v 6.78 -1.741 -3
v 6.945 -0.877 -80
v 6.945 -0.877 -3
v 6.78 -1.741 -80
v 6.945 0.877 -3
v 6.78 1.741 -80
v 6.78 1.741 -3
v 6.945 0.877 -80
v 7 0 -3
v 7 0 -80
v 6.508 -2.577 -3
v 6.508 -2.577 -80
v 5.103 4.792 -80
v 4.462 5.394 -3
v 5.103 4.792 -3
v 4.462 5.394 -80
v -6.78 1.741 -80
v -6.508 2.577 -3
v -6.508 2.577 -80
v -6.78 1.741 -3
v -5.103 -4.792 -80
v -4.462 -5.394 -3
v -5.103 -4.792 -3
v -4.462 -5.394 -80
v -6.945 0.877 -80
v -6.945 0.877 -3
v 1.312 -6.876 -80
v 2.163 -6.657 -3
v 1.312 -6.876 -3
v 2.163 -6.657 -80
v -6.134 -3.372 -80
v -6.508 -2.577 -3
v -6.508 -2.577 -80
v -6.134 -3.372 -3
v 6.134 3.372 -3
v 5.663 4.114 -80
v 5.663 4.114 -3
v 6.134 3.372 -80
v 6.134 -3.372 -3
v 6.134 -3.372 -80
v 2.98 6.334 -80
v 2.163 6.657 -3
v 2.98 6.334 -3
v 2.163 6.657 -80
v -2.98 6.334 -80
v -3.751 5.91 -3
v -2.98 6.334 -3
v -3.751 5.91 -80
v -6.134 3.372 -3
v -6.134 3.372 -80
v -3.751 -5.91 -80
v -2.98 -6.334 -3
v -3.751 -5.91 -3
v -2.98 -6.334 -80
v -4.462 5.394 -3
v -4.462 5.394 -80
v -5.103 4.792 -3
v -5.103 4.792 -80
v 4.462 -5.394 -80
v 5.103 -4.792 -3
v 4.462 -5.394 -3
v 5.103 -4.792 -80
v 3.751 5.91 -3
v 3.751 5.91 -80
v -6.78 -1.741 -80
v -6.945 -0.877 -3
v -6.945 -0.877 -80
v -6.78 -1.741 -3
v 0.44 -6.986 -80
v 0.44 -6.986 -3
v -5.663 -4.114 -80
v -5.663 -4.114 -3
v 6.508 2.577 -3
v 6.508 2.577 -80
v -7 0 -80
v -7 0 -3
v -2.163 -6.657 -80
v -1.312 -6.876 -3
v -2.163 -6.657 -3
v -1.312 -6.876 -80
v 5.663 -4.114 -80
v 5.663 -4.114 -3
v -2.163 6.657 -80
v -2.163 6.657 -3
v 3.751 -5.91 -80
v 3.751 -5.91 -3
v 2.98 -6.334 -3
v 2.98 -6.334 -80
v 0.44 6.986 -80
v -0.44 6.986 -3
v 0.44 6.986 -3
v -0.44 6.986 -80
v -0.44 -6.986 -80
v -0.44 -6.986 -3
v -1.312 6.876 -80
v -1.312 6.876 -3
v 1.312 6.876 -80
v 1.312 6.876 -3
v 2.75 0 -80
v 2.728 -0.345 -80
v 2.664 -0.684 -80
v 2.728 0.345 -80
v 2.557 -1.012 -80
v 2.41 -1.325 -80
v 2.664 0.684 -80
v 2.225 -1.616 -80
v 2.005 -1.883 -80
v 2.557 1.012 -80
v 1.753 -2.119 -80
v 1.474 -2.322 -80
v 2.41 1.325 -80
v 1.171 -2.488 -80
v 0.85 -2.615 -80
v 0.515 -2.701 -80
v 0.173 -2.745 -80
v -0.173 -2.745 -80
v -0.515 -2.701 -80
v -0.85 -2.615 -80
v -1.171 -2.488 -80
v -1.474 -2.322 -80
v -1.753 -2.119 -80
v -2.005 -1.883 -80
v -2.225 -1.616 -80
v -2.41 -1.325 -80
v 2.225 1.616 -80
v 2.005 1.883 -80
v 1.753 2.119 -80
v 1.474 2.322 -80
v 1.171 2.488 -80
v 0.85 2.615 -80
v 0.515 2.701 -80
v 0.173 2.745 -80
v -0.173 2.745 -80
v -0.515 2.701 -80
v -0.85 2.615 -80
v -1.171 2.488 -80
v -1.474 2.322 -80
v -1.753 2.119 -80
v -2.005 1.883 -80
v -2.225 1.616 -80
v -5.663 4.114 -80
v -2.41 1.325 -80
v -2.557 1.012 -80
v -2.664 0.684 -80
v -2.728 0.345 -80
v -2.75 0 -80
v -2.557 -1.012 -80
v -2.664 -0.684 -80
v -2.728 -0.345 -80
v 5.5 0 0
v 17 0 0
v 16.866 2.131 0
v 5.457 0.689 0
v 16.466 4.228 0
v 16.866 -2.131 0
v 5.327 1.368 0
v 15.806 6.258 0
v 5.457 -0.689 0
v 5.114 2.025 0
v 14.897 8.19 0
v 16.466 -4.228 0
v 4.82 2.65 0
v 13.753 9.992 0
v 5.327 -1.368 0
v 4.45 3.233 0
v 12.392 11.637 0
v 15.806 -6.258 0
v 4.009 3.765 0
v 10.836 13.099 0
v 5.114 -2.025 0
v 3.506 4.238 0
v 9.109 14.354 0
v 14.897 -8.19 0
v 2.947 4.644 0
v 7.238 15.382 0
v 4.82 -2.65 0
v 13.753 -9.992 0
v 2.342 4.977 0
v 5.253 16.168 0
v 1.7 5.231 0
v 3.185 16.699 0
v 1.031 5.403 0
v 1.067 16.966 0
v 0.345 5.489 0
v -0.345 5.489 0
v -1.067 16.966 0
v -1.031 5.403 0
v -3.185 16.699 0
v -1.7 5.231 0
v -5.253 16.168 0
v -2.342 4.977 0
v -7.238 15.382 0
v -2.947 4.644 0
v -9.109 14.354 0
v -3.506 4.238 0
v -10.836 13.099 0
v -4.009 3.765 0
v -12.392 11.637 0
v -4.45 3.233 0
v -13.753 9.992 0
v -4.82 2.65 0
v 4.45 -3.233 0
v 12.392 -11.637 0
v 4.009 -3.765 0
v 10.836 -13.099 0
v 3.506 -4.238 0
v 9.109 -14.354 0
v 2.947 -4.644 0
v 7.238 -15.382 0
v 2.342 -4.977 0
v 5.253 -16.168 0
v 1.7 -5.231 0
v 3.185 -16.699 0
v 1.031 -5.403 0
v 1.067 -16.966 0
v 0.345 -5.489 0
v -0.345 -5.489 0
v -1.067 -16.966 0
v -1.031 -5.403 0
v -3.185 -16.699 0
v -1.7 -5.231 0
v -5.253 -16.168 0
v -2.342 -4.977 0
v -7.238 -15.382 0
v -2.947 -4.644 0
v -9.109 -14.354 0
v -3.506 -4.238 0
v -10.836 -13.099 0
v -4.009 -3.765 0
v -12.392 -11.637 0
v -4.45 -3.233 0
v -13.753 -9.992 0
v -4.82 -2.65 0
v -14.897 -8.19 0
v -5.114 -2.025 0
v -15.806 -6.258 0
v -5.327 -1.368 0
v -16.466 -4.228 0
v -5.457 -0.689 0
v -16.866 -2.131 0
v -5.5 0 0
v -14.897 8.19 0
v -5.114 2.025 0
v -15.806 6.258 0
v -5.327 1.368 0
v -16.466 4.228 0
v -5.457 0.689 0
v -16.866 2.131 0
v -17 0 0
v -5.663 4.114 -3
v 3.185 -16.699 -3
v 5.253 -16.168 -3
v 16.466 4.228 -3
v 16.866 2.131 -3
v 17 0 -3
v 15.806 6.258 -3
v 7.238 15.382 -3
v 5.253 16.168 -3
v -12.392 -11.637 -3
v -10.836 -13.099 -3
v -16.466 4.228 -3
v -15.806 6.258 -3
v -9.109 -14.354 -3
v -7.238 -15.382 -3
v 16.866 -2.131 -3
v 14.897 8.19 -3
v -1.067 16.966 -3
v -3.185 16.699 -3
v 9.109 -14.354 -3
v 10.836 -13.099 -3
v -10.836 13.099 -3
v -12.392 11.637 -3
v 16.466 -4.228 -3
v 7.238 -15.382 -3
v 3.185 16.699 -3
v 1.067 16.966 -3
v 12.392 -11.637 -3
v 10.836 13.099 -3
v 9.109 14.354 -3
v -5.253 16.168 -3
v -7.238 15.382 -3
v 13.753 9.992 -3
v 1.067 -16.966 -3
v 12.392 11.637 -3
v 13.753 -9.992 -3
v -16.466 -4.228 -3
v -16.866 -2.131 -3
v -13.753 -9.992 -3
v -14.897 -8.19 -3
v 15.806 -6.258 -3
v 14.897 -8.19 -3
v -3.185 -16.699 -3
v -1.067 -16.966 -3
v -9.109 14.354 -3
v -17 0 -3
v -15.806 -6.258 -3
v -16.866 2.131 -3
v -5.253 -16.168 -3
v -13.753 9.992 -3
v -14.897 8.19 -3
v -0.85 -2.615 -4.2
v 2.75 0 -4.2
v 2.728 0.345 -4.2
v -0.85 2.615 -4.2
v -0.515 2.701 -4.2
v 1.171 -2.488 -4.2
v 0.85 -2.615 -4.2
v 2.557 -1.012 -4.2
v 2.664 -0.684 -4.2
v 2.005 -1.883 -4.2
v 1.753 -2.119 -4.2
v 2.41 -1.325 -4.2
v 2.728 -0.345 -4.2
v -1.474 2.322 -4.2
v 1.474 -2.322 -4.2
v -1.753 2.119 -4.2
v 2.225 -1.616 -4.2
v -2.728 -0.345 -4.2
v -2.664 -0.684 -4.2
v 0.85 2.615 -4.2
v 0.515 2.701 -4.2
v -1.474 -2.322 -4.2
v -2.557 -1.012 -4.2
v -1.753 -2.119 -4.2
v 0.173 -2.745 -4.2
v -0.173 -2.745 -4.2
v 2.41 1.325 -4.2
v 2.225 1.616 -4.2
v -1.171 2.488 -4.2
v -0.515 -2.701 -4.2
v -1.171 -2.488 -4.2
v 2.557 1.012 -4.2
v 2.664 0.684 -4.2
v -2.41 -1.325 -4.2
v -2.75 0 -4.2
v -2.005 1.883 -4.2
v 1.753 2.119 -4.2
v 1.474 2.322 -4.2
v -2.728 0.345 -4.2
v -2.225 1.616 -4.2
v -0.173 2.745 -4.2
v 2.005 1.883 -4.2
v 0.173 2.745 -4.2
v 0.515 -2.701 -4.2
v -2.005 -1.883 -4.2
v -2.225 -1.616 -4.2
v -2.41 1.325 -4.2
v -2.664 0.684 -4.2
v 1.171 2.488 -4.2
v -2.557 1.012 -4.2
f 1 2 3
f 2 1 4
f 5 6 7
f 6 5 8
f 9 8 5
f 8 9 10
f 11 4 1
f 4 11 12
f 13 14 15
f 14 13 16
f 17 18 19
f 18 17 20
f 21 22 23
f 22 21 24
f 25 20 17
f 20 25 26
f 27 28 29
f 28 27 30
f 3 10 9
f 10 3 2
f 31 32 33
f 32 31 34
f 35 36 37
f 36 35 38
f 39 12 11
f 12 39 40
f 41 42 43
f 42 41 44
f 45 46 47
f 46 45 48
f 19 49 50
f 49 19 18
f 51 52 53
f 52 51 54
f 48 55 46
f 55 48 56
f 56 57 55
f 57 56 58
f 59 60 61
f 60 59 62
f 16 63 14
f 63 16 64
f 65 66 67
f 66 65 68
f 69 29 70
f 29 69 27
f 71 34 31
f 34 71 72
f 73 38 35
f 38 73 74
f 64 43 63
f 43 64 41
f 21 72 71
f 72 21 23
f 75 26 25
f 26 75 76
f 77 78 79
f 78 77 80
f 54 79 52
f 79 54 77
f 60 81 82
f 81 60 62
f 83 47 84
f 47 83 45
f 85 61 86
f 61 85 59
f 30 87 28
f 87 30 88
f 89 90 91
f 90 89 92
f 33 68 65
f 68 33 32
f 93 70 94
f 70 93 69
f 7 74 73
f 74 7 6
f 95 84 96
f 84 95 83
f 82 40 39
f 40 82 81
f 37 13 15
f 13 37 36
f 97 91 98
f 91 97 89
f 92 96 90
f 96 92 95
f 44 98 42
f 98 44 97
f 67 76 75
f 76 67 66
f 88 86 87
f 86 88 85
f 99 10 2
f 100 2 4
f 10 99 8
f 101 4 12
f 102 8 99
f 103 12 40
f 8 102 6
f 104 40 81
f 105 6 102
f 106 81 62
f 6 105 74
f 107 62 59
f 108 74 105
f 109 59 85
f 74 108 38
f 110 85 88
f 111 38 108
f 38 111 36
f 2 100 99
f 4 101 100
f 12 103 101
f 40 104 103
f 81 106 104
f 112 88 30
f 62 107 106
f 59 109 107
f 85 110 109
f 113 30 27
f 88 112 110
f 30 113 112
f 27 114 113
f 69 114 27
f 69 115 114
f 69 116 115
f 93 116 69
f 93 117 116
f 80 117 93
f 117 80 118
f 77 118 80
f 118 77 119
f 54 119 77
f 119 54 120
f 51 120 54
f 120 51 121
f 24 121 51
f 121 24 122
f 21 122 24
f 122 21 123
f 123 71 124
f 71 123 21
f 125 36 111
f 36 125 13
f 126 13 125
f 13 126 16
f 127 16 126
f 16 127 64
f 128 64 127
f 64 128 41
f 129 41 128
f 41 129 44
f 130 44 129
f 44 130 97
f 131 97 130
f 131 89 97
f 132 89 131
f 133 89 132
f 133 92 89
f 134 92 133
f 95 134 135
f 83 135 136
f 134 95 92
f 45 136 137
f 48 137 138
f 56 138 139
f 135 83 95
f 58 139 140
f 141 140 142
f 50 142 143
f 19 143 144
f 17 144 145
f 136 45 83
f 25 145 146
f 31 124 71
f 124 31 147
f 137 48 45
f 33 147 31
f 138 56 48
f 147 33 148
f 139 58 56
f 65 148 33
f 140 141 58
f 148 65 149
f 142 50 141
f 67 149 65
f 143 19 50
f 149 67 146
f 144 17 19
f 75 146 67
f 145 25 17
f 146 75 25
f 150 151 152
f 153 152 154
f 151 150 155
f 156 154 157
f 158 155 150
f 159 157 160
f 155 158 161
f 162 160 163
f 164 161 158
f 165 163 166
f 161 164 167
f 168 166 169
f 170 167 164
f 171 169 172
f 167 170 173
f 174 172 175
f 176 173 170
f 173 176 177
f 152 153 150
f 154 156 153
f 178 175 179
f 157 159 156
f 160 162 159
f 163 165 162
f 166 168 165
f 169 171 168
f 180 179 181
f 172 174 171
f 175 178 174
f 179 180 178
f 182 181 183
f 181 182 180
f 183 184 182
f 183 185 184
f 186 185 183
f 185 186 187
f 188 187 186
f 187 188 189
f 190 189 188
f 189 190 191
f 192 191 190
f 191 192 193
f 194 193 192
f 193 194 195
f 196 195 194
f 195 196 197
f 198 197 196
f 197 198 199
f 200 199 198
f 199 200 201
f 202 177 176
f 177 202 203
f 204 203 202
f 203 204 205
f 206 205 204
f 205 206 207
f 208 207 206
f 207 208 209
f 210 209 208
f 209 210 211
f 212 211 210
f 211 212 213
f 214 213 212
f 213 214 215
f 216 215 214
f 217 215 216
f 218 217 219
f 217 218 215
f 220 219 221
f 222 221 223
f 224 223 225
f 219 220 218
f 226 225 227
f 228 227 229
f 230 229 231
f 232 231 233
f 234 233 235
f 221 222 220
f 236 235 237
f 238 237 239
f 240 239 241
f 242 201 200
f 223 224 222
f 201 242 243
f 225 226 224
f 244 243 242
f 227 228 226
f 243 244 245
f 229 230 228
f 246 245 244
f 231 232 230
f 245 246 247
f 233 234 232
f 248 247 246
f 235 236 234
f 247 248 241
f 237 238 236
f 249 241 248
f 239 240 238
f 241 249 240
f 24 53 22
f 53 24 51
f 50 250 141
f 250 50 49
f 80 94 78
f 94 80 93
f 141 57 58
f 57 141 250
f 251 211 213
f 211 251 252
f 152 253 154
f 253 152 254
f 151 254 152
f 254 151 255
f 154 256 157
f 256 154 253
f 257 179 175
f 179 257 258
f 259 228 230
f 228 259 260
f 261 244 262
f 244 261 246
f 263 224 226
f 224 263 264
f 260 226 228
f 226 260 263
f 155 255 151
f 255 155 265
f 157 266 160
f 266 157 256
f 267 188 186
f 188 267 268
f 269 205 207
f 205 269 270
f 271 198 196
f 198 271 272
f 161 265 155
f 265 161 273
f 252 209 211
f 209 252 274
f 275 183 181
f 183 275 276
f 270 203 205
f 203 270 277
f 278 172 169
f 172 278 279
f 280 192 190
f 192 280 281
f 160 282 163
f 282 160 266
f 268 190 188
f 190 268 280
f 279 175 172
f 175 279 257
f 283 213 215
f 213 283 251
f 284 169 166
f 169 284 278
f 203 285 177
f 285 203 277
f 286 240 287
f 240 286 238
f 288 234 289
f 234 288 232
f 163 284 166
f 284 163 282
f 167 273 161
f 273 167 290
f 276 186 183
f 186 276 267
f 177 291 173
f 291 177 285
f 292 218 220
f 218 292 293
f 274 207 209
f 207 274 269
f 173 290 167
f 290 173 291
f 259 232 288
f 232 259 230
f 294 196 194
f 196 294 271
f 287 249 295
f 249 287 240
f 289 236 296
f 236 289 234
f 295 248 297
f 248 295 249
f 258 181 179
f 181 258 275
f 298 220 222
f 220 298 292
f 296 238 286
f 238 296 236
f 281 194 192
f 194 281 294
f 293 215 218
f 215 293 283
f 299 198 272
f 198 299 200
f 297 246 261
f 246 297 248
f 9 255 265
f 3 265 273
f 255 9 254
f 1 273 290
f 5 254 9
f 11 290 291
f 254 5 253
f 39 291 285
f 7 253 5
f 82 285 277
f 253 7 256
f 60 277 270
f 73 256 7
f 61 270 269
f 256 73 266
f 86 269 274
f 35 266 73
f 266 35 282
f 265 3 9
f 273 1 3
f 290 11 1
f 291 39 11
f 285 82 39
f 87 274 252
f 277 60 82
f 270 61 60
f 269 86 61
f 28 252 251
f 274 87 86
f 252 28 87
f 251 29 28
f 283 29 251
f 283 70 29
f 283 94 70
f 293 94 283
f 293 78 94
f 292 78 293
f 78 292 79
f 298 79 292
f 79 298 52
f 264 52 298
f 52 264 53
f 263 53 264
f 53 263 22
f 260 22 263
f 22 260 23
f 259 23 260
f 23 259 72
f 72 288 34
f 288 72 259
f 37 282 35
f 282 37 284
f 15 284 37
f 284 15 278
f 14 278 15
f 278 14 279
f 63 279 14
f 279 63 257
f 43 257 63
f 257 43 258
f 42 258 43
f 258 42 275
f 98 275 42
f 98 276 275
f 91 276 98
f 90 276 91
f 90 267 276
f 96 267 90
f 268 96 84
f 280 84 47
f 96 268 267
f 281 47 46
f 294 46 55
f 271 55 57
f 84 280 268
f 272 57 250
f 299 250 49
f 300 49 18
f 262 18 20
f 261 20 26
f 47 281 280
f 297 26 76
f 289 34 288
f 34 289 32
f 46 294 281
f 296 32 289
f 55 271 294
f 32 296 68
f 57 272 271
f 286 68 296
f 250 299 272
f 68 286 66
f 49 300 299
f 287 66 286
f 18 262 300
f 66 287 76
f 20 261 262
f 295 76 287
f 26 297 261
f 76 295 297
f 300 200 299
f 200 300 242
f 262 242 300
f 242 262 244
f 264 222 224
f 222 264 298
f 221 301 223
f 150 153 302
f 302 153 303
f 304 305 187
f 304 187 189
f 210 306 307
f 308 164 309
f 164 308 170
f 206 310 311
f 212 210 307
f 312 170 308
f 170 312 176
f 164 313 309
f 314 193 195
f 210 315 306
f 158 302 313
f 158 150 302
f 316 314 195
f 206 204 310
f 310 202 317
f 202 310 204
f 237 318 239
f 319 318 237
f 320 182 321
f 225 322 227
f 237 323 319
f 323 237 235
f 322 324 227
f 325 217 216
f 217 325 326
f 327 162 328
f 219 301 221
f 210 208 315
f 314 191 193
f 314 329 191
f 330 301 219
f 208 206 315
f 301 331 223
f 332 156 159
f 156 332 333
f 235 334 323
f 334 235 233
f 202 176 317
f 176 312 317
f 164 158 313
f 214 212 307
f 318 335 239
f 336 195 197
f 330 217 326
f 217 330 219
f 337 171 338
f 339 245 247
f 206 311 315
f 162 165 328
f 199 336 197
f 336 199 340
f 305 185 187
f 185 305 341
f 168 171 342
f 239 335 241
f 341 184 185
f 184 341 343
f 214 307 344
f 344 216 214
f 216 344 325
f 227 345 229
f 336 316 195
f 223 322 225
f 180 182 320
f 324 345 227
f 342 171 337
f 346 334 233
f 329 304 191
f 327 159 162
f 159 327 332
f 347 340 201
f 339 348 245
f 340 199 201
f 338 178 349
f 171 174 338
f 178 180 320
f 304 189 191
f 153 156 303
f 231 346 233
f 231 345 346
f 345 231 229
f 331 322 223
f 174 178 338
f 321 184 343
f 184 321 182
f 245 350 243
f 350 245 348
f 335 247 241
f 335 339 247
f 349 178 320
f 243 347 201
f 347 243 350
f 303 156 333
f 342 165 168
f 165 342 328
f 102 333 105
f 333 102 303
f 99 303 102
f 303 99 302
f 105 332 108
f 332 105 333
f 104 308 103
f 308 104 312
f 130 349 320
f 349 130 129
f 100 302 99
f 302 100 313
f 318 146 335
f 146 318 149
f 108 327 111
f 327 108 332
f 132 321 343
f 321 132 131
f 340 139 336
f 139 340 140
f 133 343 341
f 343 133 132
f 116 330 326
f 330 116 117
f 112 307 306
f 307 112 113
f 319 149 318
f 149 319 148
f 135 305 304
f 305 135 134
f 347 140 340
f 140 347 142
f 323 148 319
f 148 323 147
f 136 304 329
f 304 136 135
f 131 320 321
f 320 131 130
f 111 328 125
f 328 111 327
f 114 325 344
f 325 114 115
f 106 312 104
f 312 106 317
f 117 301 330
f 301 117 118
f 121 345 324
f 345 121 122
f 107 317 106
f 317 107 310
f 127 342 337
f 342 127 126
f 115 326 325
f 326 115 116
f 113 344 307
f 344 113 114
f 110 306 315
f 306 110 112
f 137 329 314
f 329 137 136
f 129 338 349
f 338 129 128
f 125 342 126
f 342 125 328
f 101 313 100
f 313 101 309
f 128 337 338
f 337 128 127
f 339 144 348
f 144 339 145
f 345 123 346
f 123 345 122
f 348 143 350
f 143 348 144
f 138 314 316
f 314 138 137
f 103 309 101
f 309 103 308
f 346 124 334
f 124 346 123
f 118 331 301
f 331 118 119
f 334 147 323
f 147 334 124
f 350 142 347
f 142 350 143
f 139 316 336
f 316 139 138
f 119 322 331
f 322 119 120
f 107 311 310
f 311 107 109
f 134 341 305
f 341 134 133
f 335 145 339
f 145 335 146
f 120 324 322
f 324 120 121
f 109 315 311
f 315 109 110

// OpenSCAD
$fn = 50;


difference() {
	union() {
		translate(v = [0, 0, -80.0000000000]) {
			cylinder(h = 80, r = 7.0000000000);
		}
		translate(v = [0, 0, -3.0000000000]) {
			cylinder(h = 3, r = 17.0000000000);
		}
	}
	union() {
		translate(v = [0, 0, 0]) {
			rotate(a = [0, 0, 0]) {
				difference() {
					union() {
						#translate(v = [0, 0, -80.0000000000]) {
							cylinder(h = 80, r = 2.2500000000);
						}
						#translate(v = [0, 0, -4.2000000000]) {
							cylinder(h = 4.2000000000, r = 7.0000000000, r1 = 2.7500000000, r2 = 5.5000000000);
						}
						#translate(v = [0, 0, -80.0000000000]) {
							cylinder(h = 80, r = 2.7500000000);
						}
						#translate(v = [0, 0, -80.0000000000]) {
							cylinder(h = 80, r = 2.2500000000);
						}
					}
					union();
				}
			}
		}
	}
}
